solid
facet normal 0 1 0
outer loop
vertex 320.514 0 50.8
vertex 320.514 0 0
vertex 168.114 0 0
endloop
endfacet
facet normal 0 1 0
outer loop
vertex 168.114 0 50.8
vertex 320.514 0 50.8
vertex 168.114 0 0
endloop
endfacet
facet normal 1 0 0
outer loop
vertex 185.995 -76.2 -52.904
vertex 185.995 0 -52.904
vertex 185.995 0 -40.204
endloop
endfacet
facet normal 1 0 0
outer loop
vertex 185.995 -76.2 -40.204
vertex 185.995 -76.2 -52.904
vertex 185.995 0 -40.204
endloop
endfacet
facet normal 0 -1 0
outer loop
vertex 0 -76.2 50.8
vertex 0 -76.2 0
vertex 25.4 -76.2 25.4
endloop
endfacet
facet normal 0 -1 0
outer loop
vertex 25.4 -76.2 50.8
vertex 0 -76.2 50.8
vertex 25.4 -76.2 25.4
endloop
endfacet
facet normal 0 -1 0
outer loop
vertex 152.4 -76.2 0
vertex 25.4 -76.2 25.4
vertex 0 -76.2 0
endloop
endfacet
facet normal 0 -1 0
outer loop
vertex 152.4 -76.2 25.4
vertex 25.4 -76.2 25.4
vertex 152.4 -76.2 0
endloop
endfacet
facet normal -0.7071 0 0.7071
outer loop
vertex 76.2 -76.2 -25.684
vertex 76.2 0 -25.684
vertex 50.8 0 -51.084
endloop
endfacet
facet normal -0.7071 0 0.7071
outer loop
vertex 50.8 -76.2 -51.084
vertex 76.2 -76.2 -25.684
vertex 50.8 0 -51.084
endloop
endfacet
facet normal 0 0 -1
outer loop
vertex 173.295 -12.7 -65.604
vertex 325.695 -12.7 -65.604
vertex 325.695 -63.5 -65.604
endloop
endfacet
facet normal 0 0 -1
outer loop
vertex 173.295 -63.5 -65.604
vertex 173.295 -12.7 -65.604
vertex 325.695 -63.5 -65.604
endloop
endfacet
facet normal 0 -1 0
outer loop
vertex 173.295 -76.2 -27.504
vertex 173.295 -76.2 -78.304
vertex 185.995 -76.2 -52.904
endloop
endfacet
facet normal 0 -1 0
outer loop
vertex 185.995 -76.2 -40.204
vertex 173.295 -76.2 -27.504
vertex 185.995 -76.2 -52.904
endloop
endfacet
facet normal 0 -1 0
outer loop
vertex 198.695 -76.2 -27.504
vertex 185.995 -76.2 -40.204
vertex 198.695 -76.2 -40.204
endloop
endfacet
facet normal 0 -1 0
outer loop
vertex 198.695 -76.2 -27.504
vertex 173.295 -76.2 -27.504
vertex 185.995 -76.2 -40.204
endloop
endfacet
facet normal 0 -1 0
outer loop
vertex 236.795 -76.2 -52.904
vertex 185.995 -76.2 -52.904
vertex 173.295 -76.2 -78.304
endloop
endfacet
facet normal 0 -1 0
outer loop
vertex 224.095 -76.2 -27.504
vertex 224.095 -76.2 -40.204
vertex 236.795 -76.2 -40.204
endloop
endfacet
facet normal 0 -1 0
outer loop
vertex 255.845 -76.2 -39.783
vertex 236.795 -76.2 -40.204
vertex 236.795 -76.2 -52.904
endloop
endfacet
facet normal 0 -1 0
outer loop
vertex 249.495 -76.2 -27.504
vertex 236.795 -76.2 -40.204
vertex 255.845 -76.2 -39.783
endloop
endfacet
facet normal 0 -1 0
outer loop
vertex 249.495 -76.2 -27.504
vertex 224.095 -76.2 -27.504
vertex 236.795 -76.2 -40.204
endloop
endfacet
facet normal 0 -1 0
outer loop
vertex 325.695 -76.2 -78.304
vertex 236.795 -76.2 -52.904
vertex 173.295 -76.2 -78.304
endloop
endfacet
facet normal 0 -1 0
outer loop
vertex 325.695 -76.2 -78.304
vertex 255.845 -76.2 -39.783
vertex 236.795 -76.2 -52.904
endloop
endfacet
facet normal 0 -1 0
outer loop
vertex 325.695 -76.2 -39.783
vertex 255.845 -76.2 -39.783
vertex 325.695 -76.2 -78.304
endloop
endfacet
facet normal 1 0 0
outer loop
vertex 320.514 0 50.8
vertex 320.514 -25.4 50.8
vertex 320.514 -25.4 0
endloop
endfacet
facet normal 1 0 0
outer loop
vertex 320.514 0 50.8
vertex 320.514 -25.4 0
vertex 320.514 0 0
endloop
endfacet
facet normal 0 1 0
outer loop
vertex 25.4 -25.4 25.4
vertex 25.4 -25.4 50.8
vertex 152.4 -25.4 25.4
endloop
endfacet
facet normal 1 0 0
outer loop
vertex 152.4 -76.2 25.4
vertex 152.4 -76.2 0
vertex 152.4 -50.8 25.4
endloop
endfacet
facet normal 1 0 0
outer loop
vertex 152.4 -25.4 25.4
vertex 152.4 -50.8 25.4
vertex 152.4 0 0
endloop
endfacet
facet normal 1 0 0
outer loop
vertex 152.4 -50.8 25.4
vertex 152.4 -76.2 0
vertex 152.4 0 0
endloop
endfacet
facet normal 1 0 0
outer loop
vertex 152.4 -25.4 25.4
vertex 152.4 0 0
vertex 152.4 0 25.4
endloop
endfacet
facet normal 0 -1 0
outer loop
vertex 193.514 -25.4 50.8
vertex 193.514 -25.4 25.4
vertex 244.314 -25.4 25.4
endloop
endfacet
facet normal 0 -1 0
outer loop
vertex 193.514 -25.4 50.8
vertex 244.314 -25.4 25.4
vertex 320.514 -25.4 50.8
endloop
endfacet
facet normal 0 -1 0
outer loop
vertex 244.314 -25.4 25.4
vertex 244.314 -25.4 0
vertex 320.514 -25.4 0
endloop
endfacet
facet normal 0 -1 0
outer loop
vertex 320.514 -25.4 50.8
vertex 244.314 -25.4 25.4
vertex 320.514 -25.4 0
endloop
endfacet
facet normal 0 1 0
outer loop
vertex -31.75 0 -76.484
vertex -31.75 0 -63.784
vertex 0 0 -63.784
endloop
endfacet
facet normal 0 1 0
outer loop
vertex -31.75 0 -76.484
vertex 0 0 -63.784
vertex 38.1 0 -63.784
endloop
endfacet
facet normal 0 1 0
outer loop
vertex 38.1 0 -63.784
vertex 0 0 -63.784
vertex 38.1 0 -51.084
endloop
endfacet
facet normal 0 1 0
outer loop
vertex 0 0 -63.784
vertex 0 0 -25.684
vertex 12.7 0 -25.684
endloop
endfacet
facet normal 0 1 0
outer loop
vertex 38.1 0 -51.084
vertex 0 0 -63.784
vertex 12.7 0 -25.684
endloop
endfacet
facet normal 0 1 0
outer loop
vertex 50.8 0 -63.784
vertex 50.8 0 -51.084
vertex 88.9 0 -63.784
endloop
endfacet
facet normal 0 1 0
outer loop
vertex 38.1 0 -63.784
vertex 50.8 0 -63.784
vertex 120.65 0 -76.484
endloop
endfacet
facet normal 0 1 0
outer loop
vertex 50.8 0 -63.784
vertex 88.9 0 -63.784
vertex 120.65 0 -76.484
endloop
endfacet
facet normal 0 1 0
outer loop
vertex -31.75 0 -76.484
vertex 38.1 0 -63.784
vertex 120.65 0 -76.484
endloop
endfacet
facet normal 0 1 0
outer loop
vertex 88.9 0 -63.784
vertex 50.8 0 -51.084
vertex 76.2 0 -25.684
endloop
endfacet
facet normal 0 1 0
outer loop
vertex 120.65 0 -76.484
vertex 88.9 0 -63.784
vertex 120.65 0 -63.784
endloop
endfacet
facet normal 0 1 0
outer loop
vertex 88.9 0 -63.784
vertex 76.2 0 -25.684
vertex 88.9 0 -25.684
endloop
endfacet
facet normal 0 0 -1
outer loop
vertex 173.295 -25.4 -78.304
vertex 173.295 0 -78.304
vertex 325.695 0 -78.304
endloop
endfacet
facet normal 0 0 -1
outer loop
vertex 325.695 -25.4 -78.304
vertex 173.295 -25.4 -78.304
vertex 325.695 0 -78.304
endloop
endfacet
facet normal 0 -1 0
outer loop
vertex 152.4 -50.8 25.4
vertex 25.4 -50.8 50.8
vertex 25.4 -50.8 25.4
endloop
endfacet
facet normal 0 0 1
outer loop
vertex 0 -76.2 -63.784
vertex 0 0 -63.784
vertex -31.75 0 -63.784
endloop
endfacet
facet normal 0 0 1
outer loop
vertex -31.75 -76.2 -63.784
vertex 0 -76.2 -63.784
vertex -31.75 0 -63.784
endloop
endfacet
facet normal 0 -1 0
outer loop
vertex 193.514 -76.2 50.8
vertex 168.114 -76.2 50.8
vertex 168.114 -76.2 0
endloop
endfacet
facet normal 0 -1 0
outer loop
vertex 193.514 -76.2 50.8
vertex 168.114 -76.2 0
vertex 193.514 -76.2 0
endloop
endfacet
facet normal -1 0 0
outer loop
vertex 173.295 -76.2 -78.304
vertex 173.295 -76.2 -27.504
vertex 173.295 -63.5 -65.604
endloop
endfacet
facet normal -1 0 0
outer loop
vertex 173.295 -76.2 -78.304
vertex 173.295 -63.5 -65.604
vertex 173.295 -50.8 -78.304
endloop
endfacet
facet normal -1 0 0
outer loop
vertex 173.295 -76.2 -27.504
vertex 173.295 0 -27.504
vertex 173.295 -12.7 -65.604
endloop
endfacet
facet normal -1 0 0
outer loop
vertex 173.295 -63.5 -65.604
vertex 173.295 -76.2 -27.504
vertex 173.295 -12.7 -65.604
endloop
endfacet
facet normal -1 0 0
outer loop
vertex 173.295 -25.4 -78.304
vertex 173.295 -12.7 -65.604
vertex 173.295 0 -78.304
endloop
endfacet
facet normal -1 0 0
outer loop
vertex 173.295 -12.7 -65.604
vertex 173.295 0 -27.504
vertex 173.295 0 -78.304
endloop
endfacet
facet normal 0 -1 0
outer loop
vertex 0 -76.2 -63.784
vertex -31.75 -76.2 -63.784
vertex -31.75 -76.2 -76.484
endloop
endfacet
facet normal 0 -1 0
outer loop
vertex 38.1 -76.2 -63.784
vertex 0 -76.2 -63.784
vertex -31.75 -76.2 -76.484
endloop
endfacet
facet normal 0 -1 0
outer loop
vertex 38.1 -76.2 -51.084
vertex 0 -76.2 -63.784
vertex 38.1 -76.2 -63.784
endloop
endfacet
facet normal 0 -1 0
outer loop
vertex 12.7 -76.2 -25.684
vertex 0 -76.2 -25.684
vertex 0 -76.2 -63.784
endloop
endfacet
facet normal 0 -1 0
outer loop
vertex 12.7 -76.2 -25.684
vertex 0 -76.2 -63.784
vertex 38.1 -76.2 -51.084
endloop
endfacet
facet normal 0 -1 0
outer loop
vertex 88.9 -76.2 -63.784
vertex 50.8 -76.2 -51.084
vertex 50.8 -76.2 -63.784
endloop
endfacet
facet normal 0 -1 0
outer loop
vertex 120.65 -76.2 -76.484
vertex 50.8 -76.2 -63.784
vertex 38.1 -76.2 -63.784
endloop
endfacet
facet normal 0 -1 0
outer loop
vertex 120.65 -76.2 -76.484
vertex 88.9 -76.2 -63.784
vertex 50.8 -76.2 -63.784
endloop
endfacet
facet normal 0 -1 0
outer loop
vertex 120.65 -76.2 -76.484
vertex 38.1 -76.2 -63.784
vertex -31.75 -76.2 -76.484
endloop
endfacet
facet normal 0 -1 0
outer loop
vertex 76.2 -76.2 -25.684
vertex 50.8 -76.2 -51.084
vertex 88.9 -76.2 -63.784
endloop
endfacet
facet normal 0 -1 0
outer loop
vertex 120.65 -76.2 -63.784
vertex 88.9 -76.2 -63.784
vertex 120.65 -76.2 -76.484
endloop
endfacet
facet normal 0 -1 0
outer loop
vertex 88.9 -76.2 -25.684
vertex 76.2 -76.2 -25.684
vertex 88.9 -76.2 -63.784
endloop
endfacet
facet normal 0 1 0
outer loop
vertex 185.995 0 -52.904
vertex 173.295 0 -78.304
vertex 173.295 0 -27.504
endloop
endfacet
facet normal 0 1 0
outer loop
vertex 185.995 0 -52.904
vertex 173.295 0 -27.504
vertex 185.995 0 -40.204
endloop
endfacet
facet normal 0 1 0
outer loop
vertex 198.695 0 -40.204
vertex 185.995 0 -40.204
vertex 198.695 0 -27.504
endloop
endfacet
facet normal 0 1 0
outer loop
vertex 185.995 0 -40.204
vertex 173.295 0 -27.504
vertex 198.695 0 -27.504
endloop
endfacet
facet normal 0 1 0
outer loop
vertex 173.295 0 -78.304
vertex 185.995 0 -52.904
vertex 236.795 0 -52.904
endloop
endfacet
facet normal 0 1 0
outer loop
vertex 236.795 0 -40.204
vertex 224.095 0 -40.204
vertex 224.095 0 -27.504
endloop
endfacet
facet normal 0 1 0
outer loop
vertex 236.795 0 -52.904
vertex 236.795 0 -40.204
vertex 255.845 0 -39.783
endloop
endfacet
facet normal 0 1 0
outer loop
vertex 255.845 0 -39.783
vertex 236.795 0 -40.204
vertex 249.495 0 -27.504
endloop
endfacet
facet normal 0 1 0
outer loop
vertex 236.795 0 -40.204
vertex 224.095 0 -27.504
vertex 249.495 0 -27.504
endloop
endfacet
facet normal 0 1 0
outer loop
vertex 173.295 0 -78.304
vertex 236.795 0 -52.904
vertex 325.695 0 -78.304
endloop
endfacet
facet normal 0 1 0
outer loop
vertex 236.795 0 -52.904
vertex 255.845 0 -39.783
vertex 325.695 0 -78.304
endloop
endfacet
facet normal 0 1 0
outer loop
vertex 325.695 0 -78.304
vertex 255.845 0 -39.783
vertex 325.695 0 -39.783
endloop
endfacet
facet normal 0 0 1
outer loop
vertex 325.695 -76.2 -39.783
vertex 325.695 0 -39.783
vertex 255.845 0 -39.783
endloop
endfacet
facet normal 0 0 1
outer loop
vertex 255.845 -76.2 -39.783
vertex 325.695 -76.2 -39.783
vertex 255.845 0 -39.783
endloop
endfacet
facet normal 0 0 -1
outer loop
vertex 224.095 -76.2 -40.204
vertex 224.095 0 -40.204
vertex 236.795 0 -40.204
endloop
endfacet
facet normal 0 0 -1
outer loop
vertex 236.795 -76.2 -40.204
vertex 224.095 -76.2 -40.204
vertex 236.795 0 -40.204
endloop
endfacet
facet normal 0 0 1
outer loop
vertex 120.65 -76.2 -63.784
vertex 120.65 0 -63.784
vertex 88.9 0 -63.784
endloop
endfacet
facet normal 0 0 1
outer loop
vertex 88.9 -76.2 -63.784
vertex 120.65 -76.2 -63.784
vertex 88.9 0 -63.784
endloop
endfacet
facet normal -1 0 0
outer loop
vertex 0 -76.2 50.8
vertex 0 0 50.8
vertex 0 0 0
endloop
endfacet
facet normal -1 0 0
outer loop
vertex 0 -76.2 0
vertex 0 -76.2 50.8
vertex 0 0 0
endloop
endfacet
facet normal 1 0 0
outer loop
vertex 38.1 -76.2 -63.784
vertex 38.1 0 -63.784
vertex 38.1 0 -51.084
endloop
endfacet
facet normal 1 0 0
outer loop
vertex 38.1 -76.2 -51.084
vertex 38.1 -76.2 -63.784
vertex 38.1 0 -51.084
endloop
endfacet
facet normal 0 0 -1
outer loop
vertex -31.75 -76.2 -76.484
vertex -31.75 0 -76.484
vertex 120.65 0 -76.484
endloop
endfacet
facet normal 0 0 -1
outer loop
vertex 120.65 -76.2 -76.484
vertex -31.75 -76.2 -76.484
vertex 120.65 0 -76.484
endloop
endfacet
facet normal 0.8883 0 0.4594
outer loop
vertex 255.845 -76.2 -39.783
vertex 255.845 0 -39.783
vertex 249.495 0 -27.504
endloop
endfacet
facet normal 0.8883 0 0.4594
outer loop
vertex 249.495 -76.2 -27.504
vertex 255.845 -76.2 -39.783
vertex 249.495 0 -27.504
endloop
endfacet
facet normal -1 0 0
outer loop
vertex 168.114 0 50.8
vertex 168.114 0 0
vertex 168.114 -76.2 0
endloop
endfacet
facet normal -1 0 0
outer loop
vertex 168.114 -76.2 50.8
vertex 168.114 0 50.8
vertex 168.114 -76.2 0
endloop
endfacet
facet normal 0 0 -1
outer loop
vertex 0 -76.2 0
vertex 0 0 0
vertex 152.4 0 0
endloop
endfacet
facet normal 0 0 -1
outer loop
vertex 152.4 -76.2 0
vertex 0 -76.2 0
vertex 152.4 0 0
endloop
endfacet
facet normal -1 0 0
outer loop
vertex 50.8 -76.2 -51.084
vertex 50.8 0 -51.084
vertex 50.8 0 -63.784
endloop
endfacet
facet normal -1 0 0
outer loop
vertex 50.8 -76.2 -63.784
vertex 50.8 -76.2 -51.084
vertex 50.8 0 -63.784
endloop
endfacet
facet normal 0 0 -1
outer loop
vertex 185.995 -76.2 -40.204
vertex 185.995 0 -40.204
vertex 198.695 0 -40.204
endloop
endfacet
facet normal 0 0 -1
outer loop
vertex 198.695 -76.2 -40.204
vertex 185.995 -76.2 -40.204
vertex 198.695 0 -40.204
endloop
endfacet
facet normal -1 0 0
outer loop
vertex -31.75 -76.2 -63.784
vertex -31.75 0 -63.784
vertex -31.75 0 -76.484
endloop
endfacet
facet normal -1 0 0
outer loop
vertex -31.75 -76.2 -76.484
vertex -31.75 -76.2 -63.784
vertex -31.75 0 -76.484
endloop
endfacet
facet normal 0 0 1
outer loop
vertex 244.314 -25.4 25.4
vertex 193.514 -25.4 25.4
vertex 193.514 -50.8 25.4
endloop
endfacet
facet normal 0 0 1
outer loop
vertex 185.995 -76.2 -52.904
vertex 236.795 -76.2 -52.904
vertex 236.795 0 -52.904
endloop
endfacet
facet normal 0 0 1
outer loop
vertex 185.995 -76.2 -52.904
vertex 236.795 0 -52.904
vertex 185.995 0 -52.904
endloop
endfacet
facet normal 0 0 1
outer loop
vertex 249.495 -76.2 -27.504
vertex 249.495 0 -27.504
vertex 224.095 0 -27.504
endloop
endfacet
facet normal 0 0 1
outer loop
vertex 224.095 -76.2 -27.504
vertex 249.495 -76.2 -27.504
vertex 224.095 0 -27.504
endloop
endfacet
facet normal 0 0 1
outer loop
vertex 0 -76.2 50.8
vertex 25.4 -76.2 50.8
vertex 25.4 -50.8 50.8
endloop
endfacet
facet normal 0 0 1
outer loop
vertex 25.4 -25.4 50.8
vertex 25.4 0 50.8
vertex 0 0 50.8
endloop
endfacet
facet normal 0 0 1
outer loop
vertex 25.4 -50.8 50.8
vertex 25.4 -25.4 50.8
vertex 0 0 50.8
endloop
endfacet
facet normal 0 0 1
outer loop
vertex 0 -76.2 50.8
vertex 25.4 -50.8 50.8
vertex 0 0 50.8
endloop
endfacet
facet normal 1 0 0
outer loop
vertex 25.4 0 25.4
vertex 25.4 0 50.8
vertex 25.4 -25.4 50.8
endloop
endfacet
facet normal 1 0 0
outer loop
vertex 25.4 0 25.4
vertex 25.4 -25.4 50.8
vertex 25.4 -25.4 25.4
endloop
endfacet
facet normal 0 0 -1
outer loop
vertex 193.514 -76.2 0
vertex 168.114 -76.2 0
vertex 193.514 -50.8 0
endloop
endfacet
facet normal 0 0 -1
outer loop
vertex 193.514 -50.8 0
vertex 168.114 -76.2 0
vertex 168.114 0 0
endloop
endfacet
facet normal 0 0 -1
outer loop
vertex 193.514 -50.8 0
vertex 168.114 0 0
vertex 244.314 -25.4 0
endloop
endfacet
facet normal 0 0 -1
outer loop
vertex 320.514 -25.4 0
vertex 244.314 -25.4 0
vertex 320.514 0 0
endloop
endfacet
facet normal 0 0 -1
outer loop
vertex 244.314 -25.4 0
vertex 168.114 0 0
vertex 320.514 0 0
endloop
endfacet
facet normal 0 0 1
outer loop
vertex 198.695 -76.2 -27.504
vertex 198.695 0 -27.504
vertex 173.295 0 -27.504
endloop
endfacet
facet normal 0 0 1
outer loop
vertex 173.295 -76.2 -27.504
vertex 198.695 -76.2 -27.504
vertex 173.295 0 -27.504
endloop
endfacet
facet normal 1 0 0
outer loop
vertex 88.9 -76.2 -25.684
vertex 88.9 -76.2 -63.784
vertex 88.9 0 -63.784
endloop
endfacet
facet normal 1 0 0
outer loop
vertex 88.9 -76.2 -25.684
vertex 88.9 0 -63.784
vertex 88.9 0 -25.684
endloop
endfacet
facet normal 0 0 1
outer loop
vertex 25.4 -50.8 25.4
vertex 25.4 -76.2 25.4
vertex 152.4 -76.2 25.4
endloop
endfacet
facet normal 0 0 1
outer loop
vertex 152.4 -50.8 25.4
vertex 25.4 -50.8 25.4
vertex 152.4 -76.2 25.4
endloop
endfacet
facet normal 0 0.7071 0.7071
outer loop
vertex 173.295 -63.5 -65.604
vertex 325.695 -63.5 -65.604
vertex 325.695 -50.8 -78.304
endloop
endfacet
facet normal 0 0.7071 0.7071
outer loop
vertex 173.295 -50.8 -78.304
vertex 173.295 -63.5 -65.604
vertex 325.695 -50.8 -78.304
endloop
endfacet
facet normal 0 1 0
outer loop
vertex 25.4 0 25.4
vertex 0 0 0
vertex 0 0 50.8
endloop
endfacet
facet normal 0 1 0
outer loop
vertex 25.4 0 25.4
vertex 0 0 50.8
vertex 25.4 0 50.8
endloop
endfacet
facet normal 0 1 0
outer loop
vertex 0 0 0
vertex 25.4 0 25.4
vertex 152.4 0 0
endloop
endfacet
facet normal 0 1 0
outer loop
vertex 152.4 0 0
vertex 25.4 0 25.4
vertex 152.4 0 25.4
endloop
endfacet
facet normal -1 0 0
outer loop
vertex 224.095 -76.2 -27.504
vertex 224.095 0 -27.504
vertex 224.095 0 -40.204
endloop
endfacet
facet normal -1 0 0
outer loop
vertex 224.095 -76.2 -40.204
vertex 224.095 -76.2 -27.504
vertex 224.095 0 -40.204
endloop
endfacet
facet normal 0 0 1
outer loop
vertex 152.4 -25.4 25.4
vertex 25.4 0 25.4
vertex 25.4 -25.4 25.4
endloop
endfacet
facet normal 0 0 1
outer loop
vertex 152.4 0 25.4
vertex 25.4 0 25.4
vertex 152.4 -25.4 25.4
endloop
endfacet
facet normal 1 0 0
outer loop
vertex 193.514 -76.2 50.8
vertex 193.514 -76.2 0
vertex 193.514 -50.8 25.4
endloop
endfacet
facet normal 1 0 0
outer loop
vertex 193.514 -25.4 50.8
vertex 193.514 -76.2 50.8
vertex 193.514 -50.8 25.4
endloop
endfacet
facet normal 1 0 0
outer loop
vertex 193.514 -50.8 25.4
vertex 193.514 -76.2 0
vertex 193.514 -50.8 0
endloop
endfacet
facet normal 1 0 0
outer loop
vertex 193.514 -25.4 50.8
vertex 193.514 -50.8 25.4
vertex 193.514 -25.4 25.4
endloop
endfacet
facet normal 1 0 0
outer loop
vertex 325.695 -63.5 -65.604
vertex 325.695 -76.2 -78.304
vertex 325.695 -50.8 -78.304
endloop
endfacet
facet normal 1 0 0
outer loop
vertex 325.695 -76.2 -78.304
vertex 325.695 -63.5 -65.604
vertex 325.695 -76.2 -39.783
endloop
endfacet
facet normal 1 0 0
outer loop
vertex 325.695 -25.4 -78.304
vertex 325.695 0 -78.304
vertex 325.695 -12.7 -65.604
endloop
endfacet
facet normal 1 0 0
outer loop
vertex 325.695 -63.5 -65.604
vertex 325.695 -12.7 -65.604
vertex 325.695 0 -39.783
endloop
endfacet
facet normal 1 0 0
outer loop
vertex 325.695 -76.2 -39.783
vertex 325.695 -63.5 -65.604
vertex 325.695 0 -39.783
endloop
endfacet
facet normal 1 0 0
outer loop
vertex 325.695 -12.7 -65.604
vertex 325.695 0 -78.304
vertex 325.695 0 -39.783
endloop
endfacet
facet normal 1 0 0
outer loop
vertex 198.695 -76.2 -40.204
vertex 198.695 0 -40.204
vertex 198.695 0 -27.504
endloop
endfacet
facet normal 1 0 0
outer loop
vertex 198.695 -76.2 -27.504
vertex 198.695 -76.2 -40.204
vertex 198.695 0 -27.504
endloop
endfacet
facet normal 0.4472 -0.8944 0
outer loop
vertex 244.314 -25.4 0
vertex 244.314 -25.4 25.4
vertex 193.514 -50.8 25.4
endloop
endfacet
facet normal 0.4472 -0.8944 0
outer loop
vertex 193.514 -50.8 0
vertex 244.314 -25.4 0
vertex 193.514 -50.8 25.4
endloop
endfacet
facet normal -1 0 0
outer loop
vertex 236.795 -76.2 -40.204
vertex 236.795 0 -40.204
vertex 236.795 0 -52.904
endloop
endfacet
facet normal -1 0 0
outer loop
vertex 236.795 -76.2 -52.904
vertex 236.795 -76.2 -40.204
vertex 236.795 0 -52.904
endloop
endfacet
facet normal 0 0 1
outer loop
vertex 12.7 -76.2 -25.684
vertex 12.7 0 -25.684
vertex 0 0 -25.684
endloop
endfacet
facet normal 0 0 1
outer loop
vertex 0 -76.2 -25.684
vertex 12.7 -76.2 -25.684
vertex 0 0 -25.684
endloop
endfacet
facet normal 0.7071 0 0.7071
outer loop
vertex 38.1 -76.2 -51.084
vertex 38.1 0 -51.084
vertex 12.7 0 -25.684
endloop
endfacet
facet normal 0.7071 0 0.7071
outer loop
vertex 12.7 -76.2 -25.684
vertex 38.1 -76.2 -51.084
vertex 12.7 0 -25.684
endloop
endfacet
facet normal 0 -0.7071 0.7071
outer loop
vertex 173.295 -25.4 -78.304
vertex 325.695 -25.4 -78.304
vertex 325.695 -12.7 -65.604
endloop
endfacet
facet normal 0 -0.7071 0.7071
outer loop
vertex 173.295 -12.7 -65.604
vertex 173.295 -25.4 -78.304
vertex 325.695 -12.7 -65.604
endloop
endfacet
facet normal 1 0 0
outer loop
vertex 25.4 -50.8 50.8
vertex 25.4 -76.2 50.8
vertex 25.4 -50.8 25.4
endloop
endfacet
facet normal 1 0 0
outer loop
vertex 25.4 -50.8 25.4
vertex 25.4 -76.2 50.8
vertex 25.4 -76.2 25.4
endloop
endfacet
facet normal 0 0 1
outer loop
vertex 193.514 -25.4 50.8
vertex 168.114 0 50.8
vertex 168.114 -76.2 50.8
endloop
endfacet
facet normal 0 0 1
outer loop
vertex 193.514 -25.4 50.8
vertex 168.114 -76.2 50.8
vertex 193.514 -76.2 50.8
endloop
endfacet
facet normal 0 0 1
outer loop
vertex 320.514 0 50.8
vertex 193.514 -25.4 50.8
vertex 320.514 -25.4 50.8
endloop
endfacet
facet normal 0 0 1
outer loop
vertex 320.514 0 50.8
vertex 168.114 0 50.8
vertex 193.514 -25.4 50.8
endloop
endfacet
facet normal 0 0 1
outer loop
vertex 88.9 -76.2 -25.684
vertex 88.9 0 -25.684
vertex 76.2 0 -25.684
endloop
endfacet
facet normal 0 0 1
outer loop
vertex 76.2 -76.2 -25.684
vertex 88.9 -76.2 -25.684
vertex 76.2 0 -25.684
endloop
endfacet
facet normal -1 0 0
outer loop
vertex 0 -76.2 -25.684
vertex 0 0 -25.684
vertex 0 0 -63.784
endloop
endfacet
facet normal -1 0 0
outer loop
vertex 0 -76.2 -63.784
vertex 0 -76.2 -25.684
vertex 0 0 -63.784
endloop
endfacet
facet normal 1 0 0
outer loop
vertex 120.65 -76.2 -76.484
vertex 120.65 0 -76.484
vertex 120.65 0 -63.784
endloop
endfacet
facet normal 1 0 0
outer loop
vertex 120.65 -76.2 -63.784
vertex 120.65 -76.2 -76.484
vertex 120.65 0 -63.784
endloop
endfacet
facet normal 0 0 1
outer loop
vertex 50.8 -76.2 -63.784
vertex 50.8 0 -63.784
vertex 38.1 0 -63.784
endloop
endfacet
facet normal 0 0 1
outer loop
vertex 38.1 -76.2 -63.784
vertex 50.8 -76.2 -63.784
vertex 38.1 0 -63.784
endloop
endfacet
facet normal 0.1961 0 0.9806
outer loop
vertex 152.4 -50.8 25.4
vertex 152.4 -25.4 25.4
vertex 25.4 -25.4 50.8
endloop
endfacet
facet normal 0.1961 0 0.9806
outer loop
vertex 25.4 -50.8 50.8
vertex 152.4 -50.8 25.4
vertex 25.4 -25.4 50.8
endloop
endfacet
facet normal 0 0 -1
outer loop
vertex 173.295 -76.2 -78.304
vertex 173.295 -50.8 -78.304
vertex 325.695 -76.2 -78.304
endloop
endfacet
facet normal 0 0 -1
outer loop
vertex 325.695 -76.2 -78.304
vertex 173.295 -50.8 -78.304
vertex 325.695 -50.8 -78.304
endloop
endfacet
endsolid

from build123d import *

# Parameters (mm, degrees)
F1_DEPTH  = 76.2
F2_DEPTH  = 76.2
F4_DEPTH  = 25.4
F5_DEPTH  = 25.4
F6_DEPTH  = 25.4
F8_DEPTH  = 50.8
F9_W      = 50.8
F9_H      = 25.4
F10_DEPTH = 25.4
F12_DEPTH = 25.4
F14_DEPTH = 76.2
F16_DEPTH = 76.2
F18_DEPTH = 152.4


with BuildPart() as f1:
    # F0 (on Front) → F1 (new body)
    with BuildSketch(Plane.XZ):
        Polygon((0, 50.8), (0, 0), (152.4, 0), (152.4, 25.4), (25.4, 25.4), (25.4, 50.8), align=None)
    extrude(amount=F1_DEPTH)

    # F0 (on Front) → F2 (join)
    with BuildSketch(Plane.XZ):
        Polygon((25.4, 25.4), (152.4, 25.4), (25.4, 50.8), align=None)
    extrude(amount=F2_DEPTH)

    # F3 (on face) → F4 (cut)
    with BuildSketch(Plane.XZ.offset(76.2)):
        Polygon((152.4, 25.4), (25.4, 50.8), (25.4, 25.4), align=None)
    extrude(amount=-F4_DEPTH, mode=Mode.SUBTRACT)

    # F0 (on Front) → F5 (join)
    with BuildSketch(Plane.XZ):
        Polygon((25.4, 25.4), (152.4, 25.4), (25.4, 50.8), align=None)
    extrude(amount=F5_DEPTH)

    # F0 (on Front) → F6 (cut)
    with BuildSketch(Plane.XZ):
        Polygon((25.4, 25.4), (152.4, 25.4), (25.4, 50.8), align=None)
    extrude(amount=F6_DEPTH, mode=Mode.SUBTRACT)


with BuildPart() as f8:
    # F7 (on Top) → F8 (new body)
    with BuildSketch(Plane.XY):
        Polygon((320.513911, 0), (168.113911, 0), (168.113911, -76.2), (193.513911, -76.2), (193.513911, -25.4), (320.513911, -25.4), align=None)
    extrude(amount=F8_DEPTH)

    # F9 (on face) → F10 (join)
    with BuildSketch(Plane.XZ.offset(25.4)):
        with Locations((218.913911, 12.7)):
            Rectangle(F9_W, F9_H)
    extrude(amount=F10_DEPTH)

    # F11 (on face) → F12 (cut)
    with BuildSketch(Plane.XY.offset(25.4)):
        Polygon((244.313911, -25.4), (193.513911, -50.8), (244.313911, -50.8), align=None)
    extrude(amount=-F12_DEPTH, mode=Mode.SUBTRACT)


with BuildPart() as f14:
    # F13 (on Front) → F14 (new body)
    with BuildSketch(Plane.XZ):
        Polygon((-31.75, -76.483553), (120.65, -76.483553), (120.65, -63.783553), (88.9, -63.783553), (88.9, -25.683553), (76.2, -25.683553), (50.8, -51.083554), (50.8, -63.783554), (38.1, -63.783554), (38.1, -51.083554), (12.7, -25.683553), (0, -25.683553), (0, -63.783553), (-31.75, -63.783553), align=None)
    extrude(amount=F14_DEPTH)


with BuildPart() as f16:
    # F15 (on Front) → F16 (new body)
    with BuildSketch(Plane.XZ):
        Polygon((173.295313, -27.504317), (173.295313, -78.304317), (325.695313, -78.304317), (325.695313, -39.783328), (255.845313, -39.783328), (249.495313, -27.504317), (224.095313, -27.504317), (224.095313, -40.204317), (236.795313, -40.204317), (236.795313, -52.904317), (185.995313, -52.904317), (185.995313, -40.204317), (198.695313, -40.204317), (198.695313, -27.504317), align=None)
    extrude(amount=F16_DEPTH)

    # F17 (on face) → F18 (cut)
    with BuildSketch(Plane.YZ.offset(325.695313)):
        Polygon((-63.5, -65.604317), (-50.8, -78.304317), (-25.4, -78.304317), (-12.7, -65.604317), align=None)
    extrude(amount=-F18_DEPTH, mode=Mode.SUBTRACT)


solid = Compound([f1.part, f8.part, f14.part, f16.part])
